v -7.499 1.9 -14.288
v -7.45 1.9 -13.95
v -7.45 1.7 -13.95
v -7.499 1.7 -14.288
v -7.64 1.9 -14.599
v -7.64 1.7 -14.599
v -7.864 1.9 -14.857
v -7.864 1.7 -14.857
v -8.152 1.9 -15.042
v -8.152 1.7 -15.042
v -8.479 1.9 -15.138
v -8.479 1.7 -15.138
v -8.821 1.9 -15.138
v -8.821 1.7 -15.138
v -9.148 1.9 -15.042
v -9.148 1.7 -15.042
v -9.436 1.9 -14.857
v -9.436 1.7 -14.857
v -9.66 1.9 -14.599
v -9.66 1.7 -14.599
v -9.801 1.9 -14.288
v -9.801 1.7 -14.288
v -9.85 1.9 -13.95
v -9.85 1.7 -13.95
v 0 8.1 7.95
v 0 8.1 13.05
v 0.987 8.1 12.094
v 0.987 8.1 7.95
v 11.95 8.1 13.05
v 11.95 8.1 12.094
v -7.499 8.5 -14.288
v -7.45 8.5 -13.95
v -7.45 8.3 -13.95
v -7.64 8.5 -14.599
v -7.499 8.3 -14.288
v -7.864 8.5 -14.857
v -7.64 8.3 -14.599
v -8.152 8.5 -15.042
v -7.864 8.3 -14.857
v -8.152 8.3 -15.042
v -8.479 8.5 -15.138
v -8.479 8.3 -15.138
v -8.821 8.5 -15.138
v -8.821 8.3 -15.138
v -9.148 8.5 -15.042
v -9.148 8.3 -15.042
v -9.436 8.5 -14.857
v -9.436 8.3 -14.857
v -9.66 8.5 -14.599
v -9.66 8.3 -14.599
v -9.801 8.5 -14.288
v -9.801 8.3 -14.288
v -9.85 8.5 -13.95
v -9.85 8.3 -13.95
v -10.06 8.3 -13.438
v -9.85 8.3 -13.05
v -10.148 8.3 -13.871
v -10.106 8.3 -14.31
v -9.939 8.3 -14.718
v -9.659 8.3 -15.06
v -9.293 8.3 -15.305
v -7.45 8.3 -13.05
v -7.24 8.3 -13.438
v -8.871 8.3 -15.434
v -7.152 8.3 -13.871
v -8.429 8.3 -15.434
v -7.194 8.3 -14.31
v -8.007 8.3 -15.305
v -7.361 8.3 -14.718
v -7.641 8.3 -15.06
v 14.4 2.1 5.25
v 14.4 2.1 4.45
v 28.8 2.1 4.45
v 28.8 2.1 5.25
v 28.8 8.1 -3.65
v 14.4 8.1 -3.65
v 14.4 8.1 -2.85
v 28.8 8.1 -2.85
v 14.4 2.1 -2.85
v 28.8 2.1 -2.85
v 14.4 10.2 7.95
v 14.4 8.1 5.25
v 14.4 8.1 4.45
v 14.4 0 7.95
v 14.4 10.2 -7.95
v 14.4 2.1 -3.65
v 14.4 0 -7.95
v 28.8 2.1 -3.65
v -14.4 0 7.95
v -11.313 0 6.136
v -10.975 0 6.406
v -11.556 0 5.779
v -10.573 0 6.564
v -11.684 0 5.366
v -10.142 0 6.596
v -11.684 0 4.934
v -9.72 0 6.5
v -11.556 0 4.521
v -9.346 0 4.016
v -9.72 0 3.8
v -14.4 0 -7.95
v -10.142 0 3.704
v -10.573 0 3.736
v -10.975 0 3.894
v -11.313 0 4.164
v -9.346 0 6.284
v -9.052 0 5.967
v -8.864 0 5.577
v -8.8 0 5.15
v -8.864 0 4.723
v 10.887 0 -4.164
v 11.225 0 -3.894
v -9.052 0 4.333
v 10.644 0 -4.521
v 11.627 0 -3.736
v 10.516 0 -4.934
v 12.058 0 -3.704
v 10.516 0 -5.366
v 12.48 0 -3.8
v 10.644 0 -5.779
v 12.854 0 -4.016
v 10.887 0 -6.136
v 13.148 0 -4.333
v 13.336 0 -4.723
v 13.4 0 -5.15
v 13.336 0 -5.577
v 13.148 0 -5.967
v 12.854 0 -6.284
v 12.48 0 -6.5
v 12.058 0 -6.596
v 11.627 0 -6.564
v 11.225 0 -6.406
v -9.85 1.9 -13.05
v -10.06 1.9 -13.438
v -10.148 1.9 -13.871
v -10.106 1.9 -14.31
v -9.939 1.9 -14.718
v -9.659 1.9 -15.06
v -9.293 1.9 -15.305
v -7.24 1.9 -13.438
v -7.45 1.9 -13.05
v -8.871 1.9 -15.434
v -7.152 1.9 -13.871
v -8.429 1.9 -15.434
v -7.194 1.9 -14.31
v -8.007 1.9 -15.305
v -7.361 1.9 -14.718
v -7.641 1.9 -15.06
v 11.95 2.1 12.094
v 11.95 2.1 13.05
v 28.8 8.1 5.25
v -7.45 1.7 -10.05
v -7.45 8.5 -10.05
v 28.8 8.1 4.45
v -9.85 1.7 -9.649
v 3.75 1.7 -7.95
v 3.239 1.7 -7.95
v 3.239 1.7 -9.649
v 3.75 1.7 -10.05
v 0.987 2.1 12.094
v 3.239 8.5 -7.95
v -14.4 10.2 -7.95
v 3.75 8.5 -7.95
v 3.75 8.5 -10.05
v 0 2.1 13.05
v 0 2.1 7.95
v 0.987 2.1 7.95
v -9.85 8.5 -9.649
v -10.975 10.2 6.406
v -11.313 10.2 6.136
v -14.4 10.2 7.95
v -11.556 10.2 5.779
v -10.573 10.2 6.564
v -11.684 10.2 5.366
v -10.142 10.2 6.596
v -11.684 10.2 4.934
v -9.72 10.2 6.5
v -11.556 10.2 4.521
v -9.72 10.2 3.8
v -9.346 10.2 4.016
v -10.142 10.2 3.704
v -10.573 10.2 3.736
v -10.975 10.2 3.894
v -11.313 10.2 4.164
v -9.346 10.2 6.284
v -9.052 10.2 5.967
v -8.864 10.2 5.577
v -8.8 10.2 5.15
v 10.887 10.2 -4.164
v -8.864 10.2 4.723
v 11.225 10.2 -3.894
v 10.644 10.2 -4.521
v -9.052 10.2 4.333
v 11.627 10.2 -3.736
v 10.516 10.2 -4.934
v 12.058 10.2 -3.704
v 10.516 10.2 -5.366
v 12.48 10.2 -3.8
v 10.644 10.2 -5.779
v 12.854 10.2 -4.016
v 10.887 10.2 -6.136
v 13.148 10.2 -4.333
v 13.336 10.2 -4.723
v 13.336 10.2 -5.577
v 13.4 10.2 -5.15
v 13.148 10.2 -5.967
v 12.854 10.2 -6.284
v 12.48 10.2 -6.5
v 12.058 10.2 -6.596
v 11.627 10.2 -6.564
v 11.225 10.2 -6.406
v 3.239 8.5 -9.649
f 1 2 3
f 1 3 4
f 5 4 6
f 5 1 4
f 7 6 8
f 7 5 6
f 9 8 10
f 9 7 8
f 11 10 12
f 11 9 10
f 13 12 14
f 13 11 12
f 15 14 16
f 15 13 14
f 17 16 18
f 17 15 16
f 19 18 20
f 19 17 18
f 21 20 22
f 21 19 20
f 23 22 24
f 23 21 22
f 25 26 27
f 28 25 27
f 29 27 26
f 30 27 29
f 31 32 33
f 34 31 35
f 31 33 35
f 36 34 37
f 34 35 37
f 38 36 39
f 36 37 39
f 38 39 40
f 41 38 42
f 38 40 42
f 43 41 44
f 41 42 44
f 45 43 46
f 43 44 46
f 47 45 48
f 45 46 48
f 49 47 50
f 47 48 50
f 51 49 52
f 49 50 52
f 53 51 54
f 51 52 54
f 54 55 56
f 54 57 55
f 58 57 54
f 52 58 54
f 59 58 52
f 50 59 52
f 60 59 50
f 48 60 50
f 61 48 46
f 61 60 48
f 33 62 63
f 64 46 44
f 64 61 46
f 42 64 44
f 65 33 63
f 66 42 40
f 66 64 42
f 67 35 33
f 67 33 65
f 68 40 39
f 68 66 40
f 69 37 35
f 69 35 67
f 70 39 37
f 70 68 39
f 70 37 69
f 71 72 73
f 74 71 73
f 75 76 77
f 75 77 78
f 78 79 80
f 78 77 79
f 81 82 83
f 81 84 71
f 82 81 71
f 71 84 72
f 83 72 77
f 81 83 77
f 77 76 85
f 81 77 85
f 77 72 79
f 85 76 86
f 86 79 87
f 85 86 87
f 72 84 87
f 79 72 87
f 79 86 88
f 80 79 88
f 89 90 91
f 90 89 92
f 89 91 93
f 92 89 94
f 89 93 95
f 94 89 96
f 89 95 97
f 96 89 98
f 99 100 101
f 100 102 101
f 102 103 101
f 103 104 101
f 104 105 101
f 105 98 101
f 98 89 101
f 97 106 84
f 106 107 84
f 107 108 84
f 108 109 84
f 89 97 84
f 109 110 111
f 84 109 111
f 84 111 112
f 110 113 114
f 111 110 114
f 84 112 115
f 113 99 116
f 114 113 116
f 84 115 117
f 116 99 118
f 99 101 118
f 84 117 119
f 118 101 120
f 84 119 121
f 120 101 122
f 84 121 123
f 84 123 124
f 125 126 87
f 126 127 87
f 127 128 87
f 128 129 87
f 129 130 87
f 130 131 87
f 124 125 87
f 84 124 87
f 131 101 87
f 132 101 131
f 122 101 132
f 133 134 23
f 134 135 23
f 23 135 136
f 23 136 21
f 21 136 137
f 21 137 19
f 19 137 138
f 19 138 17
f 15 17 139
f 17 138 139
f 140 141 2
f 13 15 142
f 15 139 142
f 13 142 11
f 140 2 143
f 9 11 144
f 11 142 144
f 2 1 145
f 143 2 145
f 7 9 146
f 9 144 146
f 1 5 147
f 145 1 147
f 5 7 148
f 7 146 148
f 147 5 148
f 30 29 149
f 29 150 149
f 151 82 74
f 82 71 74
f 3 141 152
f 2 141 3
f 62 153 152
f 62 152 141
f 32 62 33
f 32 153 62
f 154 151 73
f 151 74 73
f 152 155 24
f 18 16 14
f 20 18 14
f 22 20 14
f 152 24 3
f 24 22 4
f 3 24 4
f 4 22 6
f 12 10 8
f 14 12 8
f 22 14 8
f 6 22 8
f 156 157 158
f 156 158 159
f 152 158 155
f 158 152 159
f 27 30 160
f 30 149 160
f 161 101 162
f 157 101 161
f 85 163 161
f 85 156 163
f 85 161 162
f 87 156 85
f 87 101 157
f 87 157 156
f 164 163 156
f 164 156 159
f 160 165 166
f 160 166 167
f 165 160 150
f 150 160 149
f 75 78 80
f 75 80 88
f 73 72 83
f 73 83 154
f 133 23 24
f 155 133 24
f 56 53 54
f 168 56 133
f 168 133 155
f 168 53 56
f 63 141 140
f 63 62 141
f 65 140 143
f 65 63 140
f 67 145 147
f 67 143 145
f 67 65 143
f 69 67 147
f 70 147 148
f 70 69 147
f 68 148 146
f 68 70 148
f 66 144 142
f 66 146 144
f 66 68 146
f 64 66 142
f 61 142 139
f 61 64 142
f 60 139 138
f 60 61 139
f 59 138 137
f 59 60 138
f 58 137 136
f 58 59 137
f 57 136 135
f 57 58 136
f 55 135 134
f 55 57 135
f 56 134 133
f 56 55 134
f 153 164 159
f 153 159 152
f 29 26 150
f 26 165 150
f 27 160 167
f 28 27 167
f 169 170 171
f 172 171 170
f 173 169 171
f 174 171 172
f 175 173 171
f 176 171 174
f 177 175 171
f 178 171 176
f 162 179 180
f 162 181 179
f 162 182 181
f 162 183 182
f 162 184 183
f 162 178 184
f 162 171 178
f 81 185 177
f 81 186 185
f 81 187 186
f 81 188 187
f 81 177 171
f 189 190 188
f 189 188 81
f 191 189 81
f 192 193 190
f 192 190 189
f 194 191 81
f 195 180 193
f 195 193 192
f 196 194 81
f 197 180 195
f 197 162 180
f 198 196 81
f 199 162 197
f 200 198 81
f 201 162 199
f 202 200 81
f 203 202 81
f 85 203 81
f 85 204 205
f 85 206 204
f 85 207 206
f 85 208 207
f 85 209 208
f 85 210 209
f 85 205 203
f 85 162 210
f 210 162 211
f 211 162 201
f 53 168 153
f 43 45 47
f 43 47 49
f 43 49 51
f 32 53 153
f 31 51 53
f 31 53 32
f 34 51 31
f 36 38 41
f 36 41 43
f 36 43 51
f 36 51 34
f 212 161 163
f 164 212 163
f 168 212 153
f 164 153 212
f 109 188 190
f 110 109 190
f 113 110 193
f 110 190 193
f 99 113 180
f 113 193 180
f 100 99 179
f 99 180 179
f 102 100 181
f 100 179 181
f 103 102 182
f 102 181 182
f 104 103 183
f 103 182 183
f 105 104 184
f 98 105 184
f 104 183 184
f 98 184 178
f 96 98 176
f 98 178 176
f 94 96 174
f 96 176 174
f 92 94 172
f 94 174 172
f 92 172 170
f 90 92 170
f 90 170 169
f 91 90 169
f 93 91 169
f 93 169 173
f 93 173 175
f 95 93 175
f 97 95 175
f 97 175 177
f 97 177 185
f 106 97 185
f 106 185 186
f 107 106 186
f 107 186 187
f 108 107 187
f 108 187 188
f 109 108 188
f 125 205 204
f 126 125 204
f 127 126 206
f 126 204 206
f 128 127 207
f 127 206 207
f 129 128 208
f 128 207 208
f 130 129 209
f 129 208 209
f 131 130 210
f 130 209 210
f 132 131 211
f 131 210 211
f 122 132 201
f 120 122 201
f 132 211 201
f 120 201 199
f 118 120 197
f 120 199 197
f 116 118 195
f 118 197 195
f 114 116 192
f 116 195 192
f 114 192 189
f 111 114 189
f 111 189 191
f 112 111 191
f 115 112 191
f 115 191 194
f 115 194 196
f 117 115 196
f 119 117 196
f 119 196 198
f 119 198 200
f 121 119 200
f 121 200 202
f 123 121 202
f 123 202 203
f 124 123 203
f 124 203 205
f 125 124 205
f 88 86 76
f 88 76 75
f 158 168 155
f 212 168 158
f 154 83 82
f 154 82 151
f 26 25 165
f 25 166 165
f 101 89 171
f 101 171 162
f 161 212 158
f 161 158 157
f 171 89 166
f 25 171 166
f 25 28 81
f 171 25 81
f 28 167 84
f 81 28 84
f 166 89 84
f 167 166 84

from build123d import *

# Parameters (mm, degrees)
SKETCH1_W                = 28.8
SKETCH1_H                = 15.9
BOSS_EXTRUDE2_DEPTH      = 10.2
SKETCH3_R                = 1.45
CUT_EXTRUDE1_DEPTH       = 17.45
SKETCH7_R                = 1.5
BOSS_EXTRUDE6_DEPTH      = 3.2
BOSS_EXTRUDE6_DEPTH_BACK = 3.2
BOSS_EXTRUDE7_DEPTH      = 3.4
BOSS_EXTRUDE7_DEPTH_BACK = 3.4
SKETCH9_W                = 14.4
SKETCH9_H                = 0.8
BOSS_EXTRUDE8_DEPTH      = 3
BOSS_EXTRUDE8_DEPTH_BACK = 3


with BuildPart() as part:
    # Sketch1 → Boss-Extrude2 (new body)
    with BuildSketch(Plane(origin=(0, 0, 0), x_dir=(1, 0, 0), z_dir=(0, 1, 0))):
        Rectangle(SKETCH1_W, SKETCH1_H)
    extrude(amount=BOSS_EXTRUDE2_DEPTH)

    # Sketch3 → Cut-Extrude1 (cut)
    with BuildSketch(Plane(origin=(0, 10.2, 0), x_dir=(1, 0, 0), z_dir=(0, 1, 0))):
        with Locations((11.95, 5.15)):
            Circle(SKETCH3_R)
        with Locations((-10.25, -5.15)):
            Circle(SKETCH3_R)
    extrude(amount=-CUT_EXTRUDE1_DEPTH, mode=Mode.SUBTRACT)



with BuildPart() as body_2:
    # Sketch7 → Boss-Extrude6 (new body, two sides)
    with BuildSketch(Plane(origin=(0, 5.1, 0), x_dir=(1, 0, 0), z_dir=(0, 1, 0))) as boss_extrude6_sk:
        with Locations((-8.65, 13.95)):
            Circle(SKETCH7_R)
    extrude(amount=BOSS_EXTRUDE6_DEPTH)
    extrude(boss_extrude6_sk.sketch, amount=-BOSS_EXTRUDE6_DEPTH_BACK)


with BuildPart() as part_1:
    add(part.part)

    add(body_2.part)  # Boss-Extrude7 merges body 2
    # Sketch8 → Boss-Extrude7 (add, two sides)
    with BuildSketch(Plane(origin=(0, 5.1, 0), x_dir=(1, 0, 0), z_dir=(0, 1, 0))) as boss_extrude7_sk:
        with BuildLine():
            ThreePointArc((-7.45, 13.95), (-8.65, 15.15), (-9.85, 13.95))
            Line((-9.85, 13.95), (-9.85, 10.05))
            Line((-9.85, 10.05), (-9.85, 9.648933868))
            Line((-9.85, 9.648933868), (-8.65, 9.648933868))
            Line((-8.65, 9.648933868), (-7.45, 9.648933868))
            Line((-7.45, 9.648933868), (3.238900305, 9.648933868))
            Line((3.238900305, 9.648933868), (3.238900305, 7.95))
            Line((3.238900305, 7.95), (3.75, 7.95))
            Line((3.75, 7.95), (3.75, 9.648933868))
            Line((3.75, 9.648933868), (3.75, 10.05))
            Line((3.75, 10.05), (3.238900305, 10.05))
            Line((3.238900305, 10.05), (-7.45, 10.05))
            Line((-7.45, 10.05), (-7.45, 13.95))
        make_face()
    extrude(amount=BOSS_EXTRUDE7_DEPTH)
    extrude(boss_extrude7_sk.sketch, amount=-BOSS_EXTRUDE7_DEPTH_BACK)

    # Sketch9 → Boss-Extrude8 (add, two sides)
    with BuildSketch(Plane(origin=(0, 5.1, 0), x_dir=(1, 0, 0), z_dir=(0, 1, 0))) as boss_extrude8_sk:
        with Locations((21.6, 3.25)):
            Rectangle(SKETCH9_W, SKETCH9_H)
        with Locations((21.6, -4.85)):
            Rectangle(SKETCH9_W, SKETCH9_H)
        Polygon((0, -7.95), (0, -13.05), (11.95, -13.05), (11.95, -12.093699041), (0.986707236, -12.093699041), (0.986707236, -7.95), align=None)
    extrude(amount=BOSS_EXTRUDE8_DEPTH)
    extrude(boss_extrude8_sk.sketch, amount=-BOSS_EXTRUDE8_DEPTH_BACK)


solid = part_1.part
